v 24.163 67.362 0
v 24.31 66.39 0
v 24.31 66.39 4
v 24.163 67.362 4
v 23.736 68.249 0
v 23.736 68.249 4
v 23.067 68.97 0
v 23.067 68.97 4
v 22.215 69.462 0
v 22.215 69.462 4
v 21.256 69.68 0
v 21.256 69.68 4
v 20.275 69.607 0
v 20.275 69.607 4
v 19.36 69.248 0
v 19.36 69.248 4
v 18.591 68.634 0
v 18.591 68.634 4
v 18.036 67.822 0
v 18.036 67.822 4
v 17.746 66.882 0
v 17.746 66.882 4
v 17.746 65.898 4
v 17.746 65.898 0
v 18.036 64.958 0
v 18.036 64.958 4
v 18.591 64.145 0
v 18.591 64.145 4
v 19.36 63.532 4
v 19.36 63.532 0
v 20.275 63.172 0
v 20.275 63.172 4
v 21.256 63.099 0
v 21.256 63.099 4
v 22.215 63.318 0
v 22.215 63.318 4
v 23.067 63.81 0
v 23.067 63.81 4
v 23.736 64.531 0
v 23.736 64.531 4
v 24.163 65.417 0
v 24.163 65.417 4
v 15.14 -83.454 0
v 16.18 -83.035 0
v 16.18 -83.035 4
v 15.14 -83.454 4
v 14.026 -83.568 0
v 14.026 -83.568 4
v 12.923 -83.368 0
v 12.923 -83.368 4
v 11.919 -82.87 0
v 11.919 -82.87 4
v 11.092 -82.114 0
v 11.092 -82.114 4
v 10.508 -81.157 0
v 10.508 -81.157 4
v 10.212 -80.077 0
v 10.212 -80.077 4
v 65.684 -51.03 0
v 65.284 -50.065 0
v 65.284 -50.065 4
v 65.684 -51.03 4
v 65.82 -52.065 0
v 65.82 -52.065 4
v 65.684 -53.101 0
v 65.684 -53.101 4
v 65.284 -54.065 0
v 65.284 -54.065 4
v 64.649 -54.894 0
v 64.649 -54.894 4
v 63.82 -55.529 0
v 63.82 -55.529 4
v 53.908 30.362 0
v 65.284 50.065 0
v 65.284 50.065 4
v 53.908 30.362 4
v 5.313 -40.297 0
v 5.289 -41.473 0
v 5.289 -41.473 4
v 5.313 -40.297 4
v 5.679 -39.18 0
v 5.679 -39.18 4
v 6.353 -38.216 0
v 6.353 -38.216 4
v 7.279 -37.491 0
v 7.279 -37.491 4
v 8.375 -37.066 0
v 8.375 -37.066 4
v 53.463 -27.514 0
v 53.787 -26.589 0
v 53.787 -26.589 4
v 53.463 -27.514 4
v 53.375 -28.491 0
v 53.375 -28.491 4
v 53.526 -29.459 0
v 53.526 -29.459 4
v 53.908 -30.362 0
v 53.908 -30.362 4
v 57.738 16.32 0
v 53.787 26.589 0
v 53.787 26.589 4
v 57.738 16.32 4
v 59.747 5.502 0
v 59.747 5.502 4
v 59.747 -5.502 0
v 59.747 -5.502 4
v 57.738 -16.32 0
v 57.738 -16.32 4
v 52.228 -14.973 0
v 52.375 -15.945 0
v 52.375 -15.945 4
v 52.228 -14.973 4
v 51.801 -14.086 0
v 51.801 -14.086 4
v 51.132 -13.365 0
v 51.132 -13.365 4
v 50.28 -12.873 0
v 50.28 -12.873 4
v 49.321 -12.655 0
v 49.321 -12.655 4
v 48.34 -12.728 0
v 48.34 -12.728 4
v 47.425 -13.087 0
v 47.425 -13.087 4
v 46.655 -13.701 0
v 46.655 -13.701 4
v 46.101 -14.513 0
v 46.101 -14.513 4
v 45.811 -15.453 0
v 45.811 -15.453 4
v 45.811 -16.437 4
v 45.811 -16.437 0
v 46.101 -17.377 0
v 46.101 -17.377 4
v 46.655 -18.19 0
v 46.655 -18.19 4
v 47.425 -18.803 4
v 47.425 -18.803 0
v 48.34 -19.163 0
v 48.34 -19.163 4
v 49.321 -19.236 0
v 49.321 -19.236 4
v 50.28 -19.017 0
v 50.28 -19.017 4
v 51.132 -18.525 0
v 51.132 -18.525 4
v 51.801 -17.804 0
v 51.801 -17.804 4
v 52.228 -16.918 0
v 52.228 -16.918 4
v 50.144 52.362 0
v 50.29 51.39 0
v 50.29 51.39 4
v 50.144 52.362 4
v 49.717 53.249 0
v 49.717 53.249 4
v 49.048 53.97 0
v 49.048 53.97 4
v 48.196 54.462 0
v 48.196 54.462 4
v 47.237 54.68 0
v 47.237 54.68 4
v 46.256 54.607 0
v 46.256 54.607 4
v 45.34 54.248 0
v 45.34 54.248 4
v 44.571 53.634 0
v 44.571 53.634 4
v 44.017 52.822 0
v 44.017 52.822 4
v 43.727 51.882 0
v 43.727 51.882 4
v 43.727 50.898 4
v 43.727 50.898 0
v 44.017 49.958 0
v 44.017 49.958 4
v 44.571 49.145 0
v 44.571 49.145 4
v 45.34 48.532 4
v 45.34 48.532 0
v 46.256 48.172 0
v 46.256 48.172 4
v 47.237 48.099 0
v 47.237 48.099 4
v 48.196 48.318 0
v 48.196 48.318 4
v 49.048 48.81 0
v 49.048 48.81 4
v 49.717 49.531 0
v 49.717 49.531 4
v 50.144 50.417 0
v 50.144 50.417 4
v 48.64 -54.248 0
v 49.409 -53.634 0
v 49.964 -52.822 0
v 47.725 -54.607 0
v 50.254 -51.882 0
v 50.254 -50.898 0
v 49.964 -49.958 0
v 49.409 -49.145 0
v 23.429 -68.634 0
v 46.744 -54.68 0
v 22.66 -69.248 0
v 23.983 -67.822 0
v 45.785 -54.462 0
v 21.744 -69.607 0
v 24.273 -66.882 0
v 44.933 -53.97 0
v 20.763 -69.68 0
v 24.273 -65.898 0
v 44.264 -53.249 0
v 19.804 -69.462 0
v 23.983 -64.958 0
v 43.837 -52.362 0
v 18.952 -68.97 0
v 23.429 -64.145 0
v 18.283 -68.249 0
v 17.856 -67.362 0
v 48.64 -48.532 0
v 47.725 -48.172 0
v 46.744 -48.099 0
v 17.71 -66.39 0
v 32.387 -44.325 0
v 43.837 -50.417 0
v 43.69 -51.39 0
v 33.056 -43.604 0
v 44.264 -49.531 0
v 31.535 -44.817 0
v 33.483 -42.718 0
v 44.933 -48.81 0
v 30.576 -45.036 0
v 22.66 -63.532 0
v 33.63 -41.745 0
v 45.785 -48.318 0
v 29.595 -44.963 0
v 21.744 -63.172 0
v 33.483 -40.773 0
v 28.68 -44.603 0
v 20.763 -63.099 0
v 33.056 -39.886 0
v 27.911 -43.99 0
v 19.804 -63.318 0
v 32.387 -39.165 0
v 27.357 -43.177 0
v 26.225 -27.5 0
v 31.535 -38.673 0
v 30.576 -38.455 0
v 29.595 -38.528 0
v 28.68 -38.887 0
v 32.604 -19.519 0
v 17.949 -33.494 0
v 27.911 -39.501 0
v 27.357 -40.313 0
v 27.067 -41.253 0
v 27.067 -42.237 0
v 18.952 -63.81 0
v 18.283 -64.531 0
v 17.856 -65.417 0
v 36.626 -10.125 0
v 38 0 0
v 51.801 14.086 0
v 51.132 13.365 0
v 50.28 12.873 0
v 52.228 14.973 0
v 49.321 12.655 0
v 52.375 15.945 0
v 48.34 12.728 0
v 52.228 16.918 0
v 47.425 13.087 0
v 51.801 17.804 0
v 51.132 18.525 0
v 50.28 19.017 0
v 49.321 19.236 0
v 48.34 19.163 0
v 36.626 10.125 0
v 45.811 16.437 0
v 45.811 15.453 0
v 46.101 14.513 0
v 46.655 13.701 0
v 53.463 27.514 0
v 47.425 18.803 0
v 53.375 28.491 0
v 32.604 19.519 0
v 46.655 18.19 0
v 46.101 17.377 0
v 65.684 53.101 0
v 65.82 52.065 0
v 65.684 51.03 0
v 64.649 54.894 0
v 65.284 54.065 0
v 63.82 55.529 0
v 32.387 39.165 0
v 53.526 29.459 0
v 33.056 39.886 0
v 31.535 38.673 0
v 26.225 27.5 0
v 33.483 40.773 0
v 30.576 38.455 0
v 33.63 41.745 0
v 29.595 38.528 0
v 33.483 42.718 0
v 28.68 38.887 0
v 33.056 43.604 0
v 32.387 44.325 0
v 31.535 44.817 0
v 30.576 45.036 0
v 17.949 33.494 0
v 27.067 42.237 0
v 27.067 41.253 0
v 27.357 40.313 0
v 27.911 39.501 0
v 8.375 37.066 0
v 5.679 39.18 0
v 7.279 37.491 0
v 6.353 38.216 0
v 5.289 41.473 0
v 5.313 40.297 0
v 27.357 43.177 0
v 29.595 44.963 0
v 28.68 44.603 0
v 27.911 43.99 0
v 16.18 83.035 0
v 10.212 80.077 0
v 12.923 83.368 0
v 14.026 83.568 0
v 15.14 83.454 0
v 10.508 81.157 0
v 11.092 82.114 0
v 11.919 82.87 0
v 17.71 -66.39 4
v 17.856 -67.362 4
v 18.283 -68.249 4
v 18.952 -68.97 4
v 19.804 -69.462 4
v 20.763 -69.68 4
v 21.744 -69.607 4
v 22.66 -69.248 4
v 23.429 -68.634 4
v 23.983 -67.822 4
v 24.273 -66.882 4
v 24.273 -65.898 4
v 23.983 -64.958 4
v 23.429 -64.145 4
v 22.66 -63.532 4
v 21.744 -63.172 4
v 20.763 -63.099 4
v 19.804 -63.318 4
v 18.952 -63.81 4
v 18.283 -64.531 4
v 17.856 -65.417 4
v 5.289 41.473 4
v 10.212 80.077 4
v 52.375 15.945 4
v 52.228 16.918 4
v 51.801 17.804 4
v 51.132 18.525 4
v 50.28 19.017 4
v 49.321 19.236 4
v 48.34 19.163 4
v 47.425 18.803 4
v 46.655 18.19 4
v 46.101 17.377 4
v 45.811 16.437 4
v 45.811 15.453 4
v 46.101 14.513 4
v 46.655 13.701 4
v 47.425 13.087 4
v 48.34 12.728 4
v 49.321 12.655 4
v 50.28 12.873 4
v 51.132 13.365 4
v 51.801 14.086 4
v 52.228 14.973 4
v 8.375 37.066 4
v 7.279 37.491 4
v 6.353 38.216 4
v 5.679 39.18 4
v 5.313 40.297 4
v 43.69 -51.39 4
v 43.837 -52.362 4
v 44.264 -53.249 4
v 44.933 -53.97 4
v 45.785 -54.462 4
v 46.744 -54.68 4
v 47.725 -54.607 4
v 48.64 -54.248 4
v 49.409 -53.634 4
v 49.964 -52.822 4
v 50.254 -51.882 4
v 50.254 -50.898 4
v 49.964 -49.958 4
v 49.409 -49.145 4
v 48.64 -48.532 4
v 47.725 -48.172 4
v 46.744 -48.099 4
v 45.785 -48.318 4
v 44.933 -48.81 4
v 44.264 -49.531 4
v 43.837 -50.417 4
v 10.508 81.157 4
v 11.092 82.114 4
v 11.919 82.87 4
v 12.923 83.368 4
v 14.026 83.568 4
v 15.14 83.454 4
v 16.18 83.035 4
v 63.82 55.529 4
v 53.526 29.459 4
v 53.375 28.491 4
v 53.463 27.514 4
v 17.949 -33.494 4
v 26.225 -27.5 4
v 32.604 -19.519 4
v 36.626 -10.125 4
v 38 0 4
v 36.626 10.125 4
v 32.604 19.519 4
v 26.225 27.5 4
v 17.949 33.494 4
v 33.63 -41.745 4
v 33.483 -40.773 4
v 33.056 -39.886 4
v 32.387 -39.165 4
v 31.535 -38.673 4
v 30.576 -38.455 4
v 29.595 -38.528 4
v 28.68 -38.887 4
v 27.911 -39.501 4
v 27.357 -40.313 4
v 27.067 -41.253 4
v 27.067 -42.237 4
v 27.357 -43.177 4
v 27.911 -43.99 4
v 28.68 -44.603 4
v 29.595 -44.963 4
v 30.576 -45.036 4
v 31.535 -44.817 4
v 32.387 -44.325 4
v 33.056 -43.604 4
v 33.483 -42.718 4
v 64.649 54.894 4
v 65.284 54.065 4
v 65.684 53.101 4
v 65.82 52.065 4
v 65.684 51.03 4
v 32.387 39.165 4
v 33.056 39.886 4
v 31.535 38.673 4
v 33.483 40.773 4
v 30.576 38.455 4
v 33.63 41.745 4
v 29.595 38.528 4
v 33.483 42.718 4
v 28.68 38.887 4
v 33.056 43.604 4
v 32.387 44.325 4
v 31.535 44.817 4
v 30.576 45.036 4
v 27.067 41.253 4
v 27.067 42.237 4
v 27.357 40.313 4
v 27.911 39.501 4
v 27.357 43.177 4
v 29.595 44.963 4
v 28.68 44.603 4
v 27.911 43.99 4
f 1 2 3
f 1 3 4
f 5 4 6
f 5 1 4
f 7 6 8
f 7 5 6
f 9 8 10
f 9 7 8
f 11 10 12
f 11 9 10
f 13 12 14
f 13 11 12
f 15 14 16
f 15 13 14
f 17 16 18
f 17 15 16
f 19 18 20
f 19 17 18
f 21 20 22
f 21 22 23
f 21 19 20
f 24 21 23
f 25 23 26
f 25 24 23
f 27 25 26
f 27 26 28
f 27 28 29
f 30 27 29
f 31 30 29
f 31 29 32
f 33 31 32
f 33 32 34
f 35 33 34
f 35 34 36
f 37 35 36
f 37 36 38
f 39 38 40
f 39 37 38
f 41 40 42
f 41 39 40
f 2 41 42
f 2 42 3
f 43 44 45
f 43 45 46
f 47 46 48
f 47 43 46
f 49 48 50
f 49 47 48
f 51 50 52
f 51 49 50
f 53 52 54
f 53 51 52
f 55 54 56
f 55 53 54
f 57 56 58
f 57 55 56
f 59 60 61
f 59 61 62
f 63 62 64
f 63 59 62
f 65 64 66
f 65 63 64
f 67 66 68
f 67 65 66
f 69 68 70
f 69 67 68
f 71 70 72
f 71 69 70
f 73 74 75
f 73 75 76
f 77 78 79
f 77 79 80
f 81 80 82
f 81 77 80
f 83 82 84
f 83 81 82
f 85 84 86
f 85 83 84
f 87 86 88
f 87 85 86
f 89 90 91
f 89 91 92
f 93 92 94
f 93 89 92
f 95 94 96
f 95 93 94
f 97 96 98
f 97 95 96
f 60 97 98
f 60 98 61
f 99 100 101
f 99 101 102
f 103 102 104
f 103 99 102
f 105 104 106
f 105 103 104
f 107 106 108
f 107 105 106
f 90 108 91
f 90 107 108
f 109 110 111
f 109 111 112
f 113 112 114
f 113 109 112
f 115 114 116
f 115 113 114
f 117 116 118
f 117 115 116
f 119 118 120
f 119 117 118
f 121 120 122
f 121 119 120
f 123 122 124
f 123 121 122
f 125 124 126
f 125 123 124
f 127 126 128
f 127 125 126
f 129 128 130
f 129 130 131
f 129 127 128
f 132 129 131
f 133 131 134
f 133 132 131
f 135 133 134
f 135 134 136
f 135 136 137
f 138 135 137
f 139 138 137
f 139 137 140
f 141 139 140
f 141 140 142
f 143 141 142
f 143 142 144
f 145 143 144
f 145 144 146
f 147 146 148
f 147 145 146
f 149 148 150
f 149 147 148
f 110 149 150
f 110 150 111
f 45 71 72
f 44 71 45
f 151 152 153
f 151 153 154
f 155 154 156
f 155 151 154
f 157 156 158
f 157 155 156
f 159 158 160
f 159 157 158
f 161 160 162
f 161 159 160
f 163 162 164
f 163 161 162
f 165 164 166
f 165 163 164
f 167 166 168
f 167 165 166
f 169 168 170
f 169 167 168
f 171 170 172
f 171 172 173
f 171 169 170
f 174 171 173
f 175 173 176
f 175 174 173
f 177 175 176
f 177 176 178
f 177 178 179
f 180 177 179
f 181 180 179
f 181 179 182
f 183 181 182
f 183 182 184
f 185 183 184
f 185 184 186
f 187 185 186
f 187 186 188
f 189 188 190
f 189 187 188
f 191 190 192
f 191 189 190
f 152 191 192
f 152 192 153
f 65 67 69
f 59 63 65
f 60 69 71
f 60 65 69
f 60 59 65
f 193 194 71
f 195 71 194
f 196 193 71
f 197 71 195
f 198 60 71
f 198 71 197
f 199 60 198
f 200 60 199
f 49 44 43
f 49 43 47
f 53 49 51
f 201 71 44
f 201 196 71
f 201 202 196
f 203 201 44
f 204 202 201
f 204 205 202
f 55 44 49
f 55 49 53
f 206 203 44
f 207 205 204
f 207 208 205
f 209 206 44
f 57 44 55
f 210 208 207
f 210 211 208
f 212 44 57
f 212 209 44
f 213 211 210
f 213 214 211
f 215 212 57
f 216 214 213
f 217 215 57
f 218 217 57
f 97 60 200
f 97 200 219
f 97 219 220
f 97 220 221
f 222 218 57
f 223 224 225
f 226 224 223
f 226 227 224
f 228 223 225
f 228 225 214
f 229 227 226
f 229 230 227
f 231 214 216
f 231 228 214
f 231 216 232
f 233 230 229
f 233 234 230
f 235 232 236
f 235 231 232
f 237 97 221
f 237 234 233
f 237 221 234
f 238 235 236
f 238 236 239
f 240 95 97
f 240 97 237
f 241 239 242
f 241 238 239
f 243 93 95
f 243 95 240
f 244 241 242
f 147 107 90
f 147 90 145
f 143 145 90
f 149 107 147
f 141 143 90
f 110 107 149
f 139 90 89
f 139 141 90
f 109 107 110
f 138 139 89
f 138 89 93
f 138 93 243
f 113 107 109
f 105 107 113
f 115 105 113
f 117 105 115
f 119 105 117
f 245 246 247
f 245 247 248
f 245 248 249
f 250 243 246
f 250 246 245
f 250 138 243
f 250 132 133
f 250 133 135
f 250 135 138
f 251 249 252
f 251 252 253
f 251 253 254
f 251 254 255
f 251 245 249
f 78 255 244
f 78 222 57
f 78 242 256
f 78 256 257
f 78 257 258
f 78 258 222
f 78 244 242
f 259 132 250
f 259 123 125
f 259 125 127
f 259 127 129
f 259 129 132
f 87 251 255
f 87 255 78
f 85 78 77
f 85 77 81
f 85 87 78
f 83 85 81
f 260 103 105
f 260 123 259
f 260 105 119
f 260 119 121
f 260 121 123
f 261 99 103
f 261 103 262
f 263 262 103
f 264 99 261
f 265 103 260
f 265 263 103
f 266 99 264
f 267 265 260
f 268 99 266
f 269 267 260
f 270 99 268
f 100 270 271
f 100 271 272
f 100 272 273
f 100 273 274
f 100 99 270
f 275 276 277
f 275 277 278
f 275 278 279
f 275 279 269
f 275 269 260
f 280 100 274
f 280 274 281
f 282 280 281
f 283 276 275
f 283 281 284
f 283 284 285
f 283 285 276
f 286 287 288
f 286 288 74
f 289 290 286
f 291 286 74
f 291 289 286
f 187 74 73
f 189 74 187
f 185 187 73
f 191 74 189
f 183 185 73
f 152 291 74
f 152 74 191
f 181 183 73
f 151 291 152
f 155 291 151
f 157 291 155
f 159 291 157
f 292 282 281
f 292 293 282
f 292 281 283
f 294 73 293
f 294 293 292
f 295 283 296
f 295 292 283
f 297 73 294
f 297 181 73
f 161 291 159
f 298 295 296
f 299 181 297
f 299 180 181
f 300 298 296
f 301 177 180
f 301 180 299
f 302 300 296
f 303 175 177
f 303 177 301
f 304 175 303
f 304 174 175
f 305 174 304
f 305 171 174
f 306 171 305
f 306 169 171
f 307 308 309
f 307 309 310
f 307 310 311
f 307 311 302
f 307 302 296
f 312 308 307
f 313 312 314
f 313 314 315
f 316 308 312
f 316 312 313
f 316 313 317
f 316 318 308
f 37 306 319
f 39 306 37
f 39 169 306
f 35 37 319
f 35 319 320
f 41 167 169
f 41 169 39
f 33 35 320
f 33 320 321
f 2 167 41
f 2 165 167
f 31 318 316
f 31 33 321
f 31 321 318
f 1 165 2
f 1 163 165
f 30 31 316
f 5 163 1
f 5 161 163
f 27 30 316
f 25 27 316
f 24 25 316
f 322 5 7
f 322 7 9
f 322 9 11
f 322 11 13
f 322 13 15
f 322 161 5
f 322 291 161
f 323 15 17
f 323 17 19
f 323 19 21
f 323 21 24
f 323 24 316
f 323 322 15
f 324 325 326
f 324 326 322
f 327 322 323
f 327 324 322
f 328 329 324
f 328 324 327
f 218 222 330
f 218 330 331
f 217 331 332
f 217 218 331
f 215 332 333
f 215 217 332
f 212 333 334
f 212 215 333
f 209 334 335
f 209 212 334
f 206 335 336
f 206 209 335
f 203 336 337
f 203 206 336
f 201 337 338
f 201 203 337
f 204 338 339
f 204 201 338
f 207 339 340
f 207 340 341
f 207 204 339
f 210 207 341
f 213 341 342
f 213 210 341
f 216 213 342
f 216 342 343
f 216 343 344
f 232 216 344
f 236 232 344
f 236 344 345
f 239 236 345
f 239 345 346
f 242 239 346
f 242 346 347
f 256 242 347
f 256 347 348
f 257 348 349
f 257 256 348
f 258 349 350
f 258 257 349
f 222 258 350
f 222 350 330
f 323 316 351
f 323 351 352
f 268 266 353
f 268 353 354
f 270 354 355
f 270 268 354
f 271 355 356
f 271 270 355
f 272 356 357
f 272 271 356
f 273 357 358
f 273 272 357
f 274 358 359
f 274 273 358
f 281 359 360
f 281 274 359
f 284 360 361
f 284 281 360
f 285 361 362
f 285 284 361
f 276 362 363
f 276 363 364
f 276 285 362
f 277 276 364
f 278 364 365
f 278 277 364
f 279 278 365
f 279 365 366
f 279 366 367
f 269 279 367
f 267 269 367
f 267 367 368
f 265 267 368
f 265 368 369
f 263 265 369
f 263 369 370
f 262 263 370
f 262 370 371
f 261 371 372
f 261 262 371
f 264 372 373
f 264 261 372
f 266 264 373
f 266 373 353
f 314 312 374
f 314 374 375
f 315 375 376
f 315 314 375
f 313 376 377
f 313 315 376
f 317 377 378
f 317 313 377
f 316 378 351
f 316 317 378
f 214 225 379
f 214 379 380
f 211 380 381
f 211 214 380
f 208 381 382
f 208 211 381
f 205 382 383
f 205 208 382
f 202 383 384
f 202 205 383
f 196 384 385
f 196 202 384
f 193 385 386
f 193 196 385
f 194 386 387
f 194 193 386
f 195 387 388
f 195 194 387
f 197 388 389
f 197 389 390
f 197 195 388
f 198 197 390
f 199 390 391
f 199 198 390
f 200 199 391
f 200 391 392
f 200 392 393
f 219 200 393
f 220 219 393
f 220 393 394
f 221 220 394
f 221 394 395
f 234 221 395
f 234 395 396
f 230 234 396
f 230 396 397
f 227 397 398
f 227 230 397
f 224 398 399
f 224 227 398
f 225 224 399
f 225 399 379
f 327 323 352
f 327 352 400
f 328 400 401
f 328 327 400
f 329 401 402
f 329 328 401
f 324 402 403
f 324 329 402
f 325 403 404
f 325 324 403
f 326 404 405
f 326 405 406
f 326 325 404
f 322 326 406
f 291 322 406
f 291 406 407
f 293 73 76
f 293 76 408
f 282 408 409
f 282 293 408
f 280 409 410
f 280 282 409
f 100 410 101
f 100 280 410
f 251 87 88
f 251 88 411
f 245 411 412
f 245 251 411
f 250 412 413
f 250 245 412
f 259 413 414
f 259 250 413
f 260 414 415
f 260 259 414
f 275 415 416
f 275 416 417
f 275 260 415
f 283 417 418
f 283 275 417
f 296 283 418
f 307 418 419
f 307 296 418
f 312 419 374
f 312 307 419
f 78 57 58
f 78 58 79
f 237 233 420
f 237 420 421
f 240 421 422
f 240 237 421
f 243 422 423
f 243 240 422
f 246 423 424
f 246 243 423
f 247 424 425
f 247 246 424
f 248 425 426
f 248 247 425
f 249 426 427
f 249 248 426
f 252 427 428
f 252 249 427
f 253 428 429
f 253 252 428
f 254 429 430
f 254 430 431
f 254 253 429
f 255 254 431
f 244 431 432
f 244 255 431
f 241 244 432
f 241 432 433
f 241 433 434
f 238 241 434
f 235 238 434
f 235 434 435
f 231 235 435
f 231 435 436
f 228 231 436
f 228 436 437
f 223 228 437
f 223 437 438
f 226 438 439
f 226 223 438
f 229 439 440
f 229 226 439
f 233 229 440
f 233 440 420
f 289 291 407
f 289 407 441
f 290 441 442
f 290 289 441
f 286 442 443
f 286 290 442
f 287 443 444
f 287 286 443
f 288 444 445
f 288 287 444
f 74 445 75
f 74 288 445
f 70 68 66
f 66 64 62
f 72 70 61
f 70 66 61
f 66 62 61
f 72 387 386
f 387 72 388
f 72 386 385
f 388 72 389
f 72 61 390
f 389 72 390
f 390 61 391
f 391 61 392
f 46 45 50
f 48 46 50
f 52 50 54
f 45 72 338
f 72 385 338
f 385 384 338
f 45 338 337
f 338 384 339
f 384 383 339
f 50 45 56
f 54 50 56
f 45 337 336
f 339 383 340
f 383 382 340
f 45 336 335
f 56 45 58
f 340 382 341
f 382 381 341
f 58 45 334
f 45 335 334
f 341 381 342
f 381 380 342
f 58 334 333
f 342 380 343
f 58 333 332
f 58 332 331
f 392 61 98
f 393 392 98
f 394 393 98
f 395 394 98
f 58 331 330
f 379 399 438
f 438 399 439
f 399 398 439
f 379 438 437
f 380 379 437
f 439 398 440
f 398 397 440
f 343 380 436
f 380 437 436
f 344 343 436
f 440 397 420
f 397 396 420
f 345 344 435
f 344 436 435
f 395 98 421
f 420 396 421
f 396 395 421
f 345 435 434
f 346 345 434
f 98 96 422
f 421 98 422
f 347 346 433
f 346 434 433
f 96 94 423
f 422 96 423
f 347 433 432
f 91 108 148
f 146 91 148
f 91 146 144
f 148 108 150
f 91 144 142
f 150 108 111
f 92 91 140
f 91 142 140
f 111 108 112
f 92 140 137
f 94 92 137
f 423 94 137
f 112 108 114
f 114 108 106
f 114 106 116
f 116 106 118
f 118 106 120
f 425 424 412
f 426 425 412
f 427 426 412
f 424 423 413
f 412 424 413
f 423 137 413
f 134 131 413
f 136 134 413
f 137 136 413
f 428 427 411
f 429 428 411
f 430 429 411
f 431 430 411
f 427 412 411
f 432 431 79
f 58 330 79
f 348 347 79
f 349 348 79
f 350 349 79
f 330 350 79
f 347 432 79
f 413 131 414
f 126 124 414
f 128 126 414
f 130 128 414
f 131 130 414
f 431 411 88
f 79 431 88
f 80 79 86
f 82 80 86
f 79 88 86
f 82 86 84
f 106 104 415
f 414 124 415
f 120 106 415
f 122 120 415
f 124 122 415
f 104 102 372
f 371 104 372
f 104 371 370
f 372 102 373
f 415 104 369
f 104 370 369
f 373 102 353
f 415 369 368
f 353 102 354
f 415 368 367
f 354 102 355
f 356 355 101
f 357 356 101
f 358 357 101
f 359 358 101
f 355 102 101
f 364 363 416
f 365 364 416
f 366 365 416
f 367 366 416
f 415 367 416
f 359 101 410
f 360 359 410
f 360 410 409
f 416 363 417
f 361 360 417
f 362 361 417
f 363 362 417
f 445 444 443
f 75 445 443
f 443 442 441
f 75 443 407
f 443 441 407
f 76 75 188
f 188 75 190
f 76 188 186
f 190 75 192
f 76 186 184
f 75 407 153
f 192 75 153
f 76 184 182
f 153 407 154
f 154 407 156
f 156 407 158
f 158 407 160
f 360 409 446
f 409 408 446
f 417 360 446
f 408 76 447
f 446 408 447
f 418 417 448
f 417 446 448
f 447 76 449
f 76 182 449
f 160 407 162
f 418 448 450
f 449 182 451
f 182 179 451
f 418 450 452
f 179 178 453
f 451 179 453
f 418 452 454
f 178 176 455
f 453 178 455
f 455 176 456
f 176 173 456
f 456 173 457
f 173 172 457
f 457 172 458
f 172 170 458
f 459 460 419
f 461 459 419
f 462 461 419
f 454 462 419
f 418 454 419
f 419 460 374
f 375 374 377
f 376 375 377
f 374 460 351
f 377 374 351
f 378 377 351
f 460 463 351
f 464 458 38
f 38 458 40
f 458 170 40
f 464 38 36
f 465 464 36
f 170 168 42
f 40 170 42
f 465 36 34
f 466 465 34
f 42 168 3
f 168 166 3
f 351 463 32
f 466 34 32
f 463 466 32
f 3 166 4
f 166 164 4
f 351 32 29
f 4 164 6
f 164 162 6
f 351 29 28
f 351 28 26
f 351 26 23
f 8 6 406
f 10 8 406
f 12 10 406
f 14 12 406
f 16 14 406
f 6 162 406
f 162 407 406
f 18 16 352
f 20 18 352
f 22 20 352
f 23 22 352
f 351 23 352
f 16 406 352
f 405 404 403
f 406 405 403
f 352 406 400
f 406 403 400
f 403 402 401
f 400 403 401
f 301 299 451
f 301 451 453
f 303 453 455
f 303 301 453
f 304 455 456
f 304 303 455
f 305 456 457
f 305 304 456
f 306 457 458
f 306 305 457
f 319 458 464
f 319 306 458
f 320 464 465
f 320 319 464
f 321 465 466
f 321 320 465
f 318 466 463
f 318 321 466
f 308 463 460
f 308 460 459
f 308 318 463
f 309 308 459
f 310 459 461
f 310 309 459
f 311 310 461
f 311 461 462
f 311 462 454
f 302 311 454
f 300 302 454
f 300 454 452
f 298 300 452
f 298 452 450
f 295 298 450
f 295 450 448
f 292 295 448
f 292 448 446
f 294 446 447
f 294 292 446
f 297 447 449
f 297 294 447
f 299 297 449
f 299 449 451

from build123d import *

# Parameters (mm, degrees)
SKETCH1_R           = 3.3
BOSS_EXTRUDE1_DEPTH = 4


with BuildPart() as part:
    # Sketch1 → Boss-Extrude1 (new body)
    with BuildSketch(Plane.XY):
        with BuildLine():
            Line((5.288922953, 41.473211764), (10.211865104, 80.076576605))
            ThreePointArc((10.211865104, 80.076576605), (12.403300333, 83.154463495), (16.179730642, 83.034671229))
            Line((16.179730642, 83.034671229), (63.820269358, 55.529393377))
            ThreePointArc((63.820269358, 55.529393377), (65.683972663, 53.100567942), (65.284370973, 50.065291762))
            Line((65.284370973, 50.065291762), (53.908491826, 30.361691097))
            ThreePointArc((53.908491826, 30.361691097), (53.374672591, 28.490644117), (53.786806351, 26.589085404))
            ThreePointArc((53.786806351, 26.589085404), (60, 0), (53.786806351, -26.589085404))
            ThreePointArc((53.786806351, -26.589085404), (53.374672591, -28.490644117), (53.908491826, -30.361691097))
            Line((53.908491826, -30.361691097), (65.284370973, -50.065291762))
            ThreePointArc((65.284370973, -50.065291762), (65.683972663, -53.100567942), (63.820269358, -55.529393377))
            Line((63.820269358, -55.529393377), (16.179730642, -83.034671229))
            ThreePointArc((16.179730642, -83.034671229), (12.403300333, -83.154463495), (10.211865104, -80.076576605))
            Line((10.211865104, -80.076576605), (5.288922953, -41.473211764))
            ThreePointArc((5.288922953, -41.473211764), (5.980180313, -38.672899027), (8.375189586, -37.065566222))
            ThreePointArc((8.375189586, -37.065566222), (38, 0), (8.375189586, 37.065566222))
            ThreePointArc((8.375189586, 37.065566222), (5.980180313, 38.672899027), (5.288922953, 41.473211764))
        make_face()
        with Locations((30.329719018, 41.74527691)):
            Circle(SKETCH1_R, mode=Mode.SUBTRACT)
        with Locations((49.074516241, 15.94527691)):
            Circle(SKETCH1_R, mode=Mode.SUBTRACT)
        with Locations((49.074516241, -15.94527691)):
            Circle(SKETCH1_R, mode=Mode.SUBTRACT)
        with Locations((30.329719018, -41.74527691)):
            Circle(SKETCH1_R, mode=Mode.SUBTRACT)
        with Locations((21.009618943, 66.389727457)):
            Circle(SKETCH1_R, mode=Mode.SUBTRACT)
        with Locations((46.990381057, 51.389727457)):
            Circle(SKETCH1_R, mode=Mode.SUBTRACT)
        with Locations(Location((46.990381057, -51.389727457, 0), (0, 0, 180))):
            Circle(SKETCH1_R, mode=Mode.SUBTRACT)
        with Locations(Location((21.009618943, -66.389727457, 0), (0, 0, 180))):
            Circle(SKETCH1_R, mode=Mode.SUBTRACT)
    extrude(amount=BOSS_EXTRUDE1_DEPTH)


solid = part.part
